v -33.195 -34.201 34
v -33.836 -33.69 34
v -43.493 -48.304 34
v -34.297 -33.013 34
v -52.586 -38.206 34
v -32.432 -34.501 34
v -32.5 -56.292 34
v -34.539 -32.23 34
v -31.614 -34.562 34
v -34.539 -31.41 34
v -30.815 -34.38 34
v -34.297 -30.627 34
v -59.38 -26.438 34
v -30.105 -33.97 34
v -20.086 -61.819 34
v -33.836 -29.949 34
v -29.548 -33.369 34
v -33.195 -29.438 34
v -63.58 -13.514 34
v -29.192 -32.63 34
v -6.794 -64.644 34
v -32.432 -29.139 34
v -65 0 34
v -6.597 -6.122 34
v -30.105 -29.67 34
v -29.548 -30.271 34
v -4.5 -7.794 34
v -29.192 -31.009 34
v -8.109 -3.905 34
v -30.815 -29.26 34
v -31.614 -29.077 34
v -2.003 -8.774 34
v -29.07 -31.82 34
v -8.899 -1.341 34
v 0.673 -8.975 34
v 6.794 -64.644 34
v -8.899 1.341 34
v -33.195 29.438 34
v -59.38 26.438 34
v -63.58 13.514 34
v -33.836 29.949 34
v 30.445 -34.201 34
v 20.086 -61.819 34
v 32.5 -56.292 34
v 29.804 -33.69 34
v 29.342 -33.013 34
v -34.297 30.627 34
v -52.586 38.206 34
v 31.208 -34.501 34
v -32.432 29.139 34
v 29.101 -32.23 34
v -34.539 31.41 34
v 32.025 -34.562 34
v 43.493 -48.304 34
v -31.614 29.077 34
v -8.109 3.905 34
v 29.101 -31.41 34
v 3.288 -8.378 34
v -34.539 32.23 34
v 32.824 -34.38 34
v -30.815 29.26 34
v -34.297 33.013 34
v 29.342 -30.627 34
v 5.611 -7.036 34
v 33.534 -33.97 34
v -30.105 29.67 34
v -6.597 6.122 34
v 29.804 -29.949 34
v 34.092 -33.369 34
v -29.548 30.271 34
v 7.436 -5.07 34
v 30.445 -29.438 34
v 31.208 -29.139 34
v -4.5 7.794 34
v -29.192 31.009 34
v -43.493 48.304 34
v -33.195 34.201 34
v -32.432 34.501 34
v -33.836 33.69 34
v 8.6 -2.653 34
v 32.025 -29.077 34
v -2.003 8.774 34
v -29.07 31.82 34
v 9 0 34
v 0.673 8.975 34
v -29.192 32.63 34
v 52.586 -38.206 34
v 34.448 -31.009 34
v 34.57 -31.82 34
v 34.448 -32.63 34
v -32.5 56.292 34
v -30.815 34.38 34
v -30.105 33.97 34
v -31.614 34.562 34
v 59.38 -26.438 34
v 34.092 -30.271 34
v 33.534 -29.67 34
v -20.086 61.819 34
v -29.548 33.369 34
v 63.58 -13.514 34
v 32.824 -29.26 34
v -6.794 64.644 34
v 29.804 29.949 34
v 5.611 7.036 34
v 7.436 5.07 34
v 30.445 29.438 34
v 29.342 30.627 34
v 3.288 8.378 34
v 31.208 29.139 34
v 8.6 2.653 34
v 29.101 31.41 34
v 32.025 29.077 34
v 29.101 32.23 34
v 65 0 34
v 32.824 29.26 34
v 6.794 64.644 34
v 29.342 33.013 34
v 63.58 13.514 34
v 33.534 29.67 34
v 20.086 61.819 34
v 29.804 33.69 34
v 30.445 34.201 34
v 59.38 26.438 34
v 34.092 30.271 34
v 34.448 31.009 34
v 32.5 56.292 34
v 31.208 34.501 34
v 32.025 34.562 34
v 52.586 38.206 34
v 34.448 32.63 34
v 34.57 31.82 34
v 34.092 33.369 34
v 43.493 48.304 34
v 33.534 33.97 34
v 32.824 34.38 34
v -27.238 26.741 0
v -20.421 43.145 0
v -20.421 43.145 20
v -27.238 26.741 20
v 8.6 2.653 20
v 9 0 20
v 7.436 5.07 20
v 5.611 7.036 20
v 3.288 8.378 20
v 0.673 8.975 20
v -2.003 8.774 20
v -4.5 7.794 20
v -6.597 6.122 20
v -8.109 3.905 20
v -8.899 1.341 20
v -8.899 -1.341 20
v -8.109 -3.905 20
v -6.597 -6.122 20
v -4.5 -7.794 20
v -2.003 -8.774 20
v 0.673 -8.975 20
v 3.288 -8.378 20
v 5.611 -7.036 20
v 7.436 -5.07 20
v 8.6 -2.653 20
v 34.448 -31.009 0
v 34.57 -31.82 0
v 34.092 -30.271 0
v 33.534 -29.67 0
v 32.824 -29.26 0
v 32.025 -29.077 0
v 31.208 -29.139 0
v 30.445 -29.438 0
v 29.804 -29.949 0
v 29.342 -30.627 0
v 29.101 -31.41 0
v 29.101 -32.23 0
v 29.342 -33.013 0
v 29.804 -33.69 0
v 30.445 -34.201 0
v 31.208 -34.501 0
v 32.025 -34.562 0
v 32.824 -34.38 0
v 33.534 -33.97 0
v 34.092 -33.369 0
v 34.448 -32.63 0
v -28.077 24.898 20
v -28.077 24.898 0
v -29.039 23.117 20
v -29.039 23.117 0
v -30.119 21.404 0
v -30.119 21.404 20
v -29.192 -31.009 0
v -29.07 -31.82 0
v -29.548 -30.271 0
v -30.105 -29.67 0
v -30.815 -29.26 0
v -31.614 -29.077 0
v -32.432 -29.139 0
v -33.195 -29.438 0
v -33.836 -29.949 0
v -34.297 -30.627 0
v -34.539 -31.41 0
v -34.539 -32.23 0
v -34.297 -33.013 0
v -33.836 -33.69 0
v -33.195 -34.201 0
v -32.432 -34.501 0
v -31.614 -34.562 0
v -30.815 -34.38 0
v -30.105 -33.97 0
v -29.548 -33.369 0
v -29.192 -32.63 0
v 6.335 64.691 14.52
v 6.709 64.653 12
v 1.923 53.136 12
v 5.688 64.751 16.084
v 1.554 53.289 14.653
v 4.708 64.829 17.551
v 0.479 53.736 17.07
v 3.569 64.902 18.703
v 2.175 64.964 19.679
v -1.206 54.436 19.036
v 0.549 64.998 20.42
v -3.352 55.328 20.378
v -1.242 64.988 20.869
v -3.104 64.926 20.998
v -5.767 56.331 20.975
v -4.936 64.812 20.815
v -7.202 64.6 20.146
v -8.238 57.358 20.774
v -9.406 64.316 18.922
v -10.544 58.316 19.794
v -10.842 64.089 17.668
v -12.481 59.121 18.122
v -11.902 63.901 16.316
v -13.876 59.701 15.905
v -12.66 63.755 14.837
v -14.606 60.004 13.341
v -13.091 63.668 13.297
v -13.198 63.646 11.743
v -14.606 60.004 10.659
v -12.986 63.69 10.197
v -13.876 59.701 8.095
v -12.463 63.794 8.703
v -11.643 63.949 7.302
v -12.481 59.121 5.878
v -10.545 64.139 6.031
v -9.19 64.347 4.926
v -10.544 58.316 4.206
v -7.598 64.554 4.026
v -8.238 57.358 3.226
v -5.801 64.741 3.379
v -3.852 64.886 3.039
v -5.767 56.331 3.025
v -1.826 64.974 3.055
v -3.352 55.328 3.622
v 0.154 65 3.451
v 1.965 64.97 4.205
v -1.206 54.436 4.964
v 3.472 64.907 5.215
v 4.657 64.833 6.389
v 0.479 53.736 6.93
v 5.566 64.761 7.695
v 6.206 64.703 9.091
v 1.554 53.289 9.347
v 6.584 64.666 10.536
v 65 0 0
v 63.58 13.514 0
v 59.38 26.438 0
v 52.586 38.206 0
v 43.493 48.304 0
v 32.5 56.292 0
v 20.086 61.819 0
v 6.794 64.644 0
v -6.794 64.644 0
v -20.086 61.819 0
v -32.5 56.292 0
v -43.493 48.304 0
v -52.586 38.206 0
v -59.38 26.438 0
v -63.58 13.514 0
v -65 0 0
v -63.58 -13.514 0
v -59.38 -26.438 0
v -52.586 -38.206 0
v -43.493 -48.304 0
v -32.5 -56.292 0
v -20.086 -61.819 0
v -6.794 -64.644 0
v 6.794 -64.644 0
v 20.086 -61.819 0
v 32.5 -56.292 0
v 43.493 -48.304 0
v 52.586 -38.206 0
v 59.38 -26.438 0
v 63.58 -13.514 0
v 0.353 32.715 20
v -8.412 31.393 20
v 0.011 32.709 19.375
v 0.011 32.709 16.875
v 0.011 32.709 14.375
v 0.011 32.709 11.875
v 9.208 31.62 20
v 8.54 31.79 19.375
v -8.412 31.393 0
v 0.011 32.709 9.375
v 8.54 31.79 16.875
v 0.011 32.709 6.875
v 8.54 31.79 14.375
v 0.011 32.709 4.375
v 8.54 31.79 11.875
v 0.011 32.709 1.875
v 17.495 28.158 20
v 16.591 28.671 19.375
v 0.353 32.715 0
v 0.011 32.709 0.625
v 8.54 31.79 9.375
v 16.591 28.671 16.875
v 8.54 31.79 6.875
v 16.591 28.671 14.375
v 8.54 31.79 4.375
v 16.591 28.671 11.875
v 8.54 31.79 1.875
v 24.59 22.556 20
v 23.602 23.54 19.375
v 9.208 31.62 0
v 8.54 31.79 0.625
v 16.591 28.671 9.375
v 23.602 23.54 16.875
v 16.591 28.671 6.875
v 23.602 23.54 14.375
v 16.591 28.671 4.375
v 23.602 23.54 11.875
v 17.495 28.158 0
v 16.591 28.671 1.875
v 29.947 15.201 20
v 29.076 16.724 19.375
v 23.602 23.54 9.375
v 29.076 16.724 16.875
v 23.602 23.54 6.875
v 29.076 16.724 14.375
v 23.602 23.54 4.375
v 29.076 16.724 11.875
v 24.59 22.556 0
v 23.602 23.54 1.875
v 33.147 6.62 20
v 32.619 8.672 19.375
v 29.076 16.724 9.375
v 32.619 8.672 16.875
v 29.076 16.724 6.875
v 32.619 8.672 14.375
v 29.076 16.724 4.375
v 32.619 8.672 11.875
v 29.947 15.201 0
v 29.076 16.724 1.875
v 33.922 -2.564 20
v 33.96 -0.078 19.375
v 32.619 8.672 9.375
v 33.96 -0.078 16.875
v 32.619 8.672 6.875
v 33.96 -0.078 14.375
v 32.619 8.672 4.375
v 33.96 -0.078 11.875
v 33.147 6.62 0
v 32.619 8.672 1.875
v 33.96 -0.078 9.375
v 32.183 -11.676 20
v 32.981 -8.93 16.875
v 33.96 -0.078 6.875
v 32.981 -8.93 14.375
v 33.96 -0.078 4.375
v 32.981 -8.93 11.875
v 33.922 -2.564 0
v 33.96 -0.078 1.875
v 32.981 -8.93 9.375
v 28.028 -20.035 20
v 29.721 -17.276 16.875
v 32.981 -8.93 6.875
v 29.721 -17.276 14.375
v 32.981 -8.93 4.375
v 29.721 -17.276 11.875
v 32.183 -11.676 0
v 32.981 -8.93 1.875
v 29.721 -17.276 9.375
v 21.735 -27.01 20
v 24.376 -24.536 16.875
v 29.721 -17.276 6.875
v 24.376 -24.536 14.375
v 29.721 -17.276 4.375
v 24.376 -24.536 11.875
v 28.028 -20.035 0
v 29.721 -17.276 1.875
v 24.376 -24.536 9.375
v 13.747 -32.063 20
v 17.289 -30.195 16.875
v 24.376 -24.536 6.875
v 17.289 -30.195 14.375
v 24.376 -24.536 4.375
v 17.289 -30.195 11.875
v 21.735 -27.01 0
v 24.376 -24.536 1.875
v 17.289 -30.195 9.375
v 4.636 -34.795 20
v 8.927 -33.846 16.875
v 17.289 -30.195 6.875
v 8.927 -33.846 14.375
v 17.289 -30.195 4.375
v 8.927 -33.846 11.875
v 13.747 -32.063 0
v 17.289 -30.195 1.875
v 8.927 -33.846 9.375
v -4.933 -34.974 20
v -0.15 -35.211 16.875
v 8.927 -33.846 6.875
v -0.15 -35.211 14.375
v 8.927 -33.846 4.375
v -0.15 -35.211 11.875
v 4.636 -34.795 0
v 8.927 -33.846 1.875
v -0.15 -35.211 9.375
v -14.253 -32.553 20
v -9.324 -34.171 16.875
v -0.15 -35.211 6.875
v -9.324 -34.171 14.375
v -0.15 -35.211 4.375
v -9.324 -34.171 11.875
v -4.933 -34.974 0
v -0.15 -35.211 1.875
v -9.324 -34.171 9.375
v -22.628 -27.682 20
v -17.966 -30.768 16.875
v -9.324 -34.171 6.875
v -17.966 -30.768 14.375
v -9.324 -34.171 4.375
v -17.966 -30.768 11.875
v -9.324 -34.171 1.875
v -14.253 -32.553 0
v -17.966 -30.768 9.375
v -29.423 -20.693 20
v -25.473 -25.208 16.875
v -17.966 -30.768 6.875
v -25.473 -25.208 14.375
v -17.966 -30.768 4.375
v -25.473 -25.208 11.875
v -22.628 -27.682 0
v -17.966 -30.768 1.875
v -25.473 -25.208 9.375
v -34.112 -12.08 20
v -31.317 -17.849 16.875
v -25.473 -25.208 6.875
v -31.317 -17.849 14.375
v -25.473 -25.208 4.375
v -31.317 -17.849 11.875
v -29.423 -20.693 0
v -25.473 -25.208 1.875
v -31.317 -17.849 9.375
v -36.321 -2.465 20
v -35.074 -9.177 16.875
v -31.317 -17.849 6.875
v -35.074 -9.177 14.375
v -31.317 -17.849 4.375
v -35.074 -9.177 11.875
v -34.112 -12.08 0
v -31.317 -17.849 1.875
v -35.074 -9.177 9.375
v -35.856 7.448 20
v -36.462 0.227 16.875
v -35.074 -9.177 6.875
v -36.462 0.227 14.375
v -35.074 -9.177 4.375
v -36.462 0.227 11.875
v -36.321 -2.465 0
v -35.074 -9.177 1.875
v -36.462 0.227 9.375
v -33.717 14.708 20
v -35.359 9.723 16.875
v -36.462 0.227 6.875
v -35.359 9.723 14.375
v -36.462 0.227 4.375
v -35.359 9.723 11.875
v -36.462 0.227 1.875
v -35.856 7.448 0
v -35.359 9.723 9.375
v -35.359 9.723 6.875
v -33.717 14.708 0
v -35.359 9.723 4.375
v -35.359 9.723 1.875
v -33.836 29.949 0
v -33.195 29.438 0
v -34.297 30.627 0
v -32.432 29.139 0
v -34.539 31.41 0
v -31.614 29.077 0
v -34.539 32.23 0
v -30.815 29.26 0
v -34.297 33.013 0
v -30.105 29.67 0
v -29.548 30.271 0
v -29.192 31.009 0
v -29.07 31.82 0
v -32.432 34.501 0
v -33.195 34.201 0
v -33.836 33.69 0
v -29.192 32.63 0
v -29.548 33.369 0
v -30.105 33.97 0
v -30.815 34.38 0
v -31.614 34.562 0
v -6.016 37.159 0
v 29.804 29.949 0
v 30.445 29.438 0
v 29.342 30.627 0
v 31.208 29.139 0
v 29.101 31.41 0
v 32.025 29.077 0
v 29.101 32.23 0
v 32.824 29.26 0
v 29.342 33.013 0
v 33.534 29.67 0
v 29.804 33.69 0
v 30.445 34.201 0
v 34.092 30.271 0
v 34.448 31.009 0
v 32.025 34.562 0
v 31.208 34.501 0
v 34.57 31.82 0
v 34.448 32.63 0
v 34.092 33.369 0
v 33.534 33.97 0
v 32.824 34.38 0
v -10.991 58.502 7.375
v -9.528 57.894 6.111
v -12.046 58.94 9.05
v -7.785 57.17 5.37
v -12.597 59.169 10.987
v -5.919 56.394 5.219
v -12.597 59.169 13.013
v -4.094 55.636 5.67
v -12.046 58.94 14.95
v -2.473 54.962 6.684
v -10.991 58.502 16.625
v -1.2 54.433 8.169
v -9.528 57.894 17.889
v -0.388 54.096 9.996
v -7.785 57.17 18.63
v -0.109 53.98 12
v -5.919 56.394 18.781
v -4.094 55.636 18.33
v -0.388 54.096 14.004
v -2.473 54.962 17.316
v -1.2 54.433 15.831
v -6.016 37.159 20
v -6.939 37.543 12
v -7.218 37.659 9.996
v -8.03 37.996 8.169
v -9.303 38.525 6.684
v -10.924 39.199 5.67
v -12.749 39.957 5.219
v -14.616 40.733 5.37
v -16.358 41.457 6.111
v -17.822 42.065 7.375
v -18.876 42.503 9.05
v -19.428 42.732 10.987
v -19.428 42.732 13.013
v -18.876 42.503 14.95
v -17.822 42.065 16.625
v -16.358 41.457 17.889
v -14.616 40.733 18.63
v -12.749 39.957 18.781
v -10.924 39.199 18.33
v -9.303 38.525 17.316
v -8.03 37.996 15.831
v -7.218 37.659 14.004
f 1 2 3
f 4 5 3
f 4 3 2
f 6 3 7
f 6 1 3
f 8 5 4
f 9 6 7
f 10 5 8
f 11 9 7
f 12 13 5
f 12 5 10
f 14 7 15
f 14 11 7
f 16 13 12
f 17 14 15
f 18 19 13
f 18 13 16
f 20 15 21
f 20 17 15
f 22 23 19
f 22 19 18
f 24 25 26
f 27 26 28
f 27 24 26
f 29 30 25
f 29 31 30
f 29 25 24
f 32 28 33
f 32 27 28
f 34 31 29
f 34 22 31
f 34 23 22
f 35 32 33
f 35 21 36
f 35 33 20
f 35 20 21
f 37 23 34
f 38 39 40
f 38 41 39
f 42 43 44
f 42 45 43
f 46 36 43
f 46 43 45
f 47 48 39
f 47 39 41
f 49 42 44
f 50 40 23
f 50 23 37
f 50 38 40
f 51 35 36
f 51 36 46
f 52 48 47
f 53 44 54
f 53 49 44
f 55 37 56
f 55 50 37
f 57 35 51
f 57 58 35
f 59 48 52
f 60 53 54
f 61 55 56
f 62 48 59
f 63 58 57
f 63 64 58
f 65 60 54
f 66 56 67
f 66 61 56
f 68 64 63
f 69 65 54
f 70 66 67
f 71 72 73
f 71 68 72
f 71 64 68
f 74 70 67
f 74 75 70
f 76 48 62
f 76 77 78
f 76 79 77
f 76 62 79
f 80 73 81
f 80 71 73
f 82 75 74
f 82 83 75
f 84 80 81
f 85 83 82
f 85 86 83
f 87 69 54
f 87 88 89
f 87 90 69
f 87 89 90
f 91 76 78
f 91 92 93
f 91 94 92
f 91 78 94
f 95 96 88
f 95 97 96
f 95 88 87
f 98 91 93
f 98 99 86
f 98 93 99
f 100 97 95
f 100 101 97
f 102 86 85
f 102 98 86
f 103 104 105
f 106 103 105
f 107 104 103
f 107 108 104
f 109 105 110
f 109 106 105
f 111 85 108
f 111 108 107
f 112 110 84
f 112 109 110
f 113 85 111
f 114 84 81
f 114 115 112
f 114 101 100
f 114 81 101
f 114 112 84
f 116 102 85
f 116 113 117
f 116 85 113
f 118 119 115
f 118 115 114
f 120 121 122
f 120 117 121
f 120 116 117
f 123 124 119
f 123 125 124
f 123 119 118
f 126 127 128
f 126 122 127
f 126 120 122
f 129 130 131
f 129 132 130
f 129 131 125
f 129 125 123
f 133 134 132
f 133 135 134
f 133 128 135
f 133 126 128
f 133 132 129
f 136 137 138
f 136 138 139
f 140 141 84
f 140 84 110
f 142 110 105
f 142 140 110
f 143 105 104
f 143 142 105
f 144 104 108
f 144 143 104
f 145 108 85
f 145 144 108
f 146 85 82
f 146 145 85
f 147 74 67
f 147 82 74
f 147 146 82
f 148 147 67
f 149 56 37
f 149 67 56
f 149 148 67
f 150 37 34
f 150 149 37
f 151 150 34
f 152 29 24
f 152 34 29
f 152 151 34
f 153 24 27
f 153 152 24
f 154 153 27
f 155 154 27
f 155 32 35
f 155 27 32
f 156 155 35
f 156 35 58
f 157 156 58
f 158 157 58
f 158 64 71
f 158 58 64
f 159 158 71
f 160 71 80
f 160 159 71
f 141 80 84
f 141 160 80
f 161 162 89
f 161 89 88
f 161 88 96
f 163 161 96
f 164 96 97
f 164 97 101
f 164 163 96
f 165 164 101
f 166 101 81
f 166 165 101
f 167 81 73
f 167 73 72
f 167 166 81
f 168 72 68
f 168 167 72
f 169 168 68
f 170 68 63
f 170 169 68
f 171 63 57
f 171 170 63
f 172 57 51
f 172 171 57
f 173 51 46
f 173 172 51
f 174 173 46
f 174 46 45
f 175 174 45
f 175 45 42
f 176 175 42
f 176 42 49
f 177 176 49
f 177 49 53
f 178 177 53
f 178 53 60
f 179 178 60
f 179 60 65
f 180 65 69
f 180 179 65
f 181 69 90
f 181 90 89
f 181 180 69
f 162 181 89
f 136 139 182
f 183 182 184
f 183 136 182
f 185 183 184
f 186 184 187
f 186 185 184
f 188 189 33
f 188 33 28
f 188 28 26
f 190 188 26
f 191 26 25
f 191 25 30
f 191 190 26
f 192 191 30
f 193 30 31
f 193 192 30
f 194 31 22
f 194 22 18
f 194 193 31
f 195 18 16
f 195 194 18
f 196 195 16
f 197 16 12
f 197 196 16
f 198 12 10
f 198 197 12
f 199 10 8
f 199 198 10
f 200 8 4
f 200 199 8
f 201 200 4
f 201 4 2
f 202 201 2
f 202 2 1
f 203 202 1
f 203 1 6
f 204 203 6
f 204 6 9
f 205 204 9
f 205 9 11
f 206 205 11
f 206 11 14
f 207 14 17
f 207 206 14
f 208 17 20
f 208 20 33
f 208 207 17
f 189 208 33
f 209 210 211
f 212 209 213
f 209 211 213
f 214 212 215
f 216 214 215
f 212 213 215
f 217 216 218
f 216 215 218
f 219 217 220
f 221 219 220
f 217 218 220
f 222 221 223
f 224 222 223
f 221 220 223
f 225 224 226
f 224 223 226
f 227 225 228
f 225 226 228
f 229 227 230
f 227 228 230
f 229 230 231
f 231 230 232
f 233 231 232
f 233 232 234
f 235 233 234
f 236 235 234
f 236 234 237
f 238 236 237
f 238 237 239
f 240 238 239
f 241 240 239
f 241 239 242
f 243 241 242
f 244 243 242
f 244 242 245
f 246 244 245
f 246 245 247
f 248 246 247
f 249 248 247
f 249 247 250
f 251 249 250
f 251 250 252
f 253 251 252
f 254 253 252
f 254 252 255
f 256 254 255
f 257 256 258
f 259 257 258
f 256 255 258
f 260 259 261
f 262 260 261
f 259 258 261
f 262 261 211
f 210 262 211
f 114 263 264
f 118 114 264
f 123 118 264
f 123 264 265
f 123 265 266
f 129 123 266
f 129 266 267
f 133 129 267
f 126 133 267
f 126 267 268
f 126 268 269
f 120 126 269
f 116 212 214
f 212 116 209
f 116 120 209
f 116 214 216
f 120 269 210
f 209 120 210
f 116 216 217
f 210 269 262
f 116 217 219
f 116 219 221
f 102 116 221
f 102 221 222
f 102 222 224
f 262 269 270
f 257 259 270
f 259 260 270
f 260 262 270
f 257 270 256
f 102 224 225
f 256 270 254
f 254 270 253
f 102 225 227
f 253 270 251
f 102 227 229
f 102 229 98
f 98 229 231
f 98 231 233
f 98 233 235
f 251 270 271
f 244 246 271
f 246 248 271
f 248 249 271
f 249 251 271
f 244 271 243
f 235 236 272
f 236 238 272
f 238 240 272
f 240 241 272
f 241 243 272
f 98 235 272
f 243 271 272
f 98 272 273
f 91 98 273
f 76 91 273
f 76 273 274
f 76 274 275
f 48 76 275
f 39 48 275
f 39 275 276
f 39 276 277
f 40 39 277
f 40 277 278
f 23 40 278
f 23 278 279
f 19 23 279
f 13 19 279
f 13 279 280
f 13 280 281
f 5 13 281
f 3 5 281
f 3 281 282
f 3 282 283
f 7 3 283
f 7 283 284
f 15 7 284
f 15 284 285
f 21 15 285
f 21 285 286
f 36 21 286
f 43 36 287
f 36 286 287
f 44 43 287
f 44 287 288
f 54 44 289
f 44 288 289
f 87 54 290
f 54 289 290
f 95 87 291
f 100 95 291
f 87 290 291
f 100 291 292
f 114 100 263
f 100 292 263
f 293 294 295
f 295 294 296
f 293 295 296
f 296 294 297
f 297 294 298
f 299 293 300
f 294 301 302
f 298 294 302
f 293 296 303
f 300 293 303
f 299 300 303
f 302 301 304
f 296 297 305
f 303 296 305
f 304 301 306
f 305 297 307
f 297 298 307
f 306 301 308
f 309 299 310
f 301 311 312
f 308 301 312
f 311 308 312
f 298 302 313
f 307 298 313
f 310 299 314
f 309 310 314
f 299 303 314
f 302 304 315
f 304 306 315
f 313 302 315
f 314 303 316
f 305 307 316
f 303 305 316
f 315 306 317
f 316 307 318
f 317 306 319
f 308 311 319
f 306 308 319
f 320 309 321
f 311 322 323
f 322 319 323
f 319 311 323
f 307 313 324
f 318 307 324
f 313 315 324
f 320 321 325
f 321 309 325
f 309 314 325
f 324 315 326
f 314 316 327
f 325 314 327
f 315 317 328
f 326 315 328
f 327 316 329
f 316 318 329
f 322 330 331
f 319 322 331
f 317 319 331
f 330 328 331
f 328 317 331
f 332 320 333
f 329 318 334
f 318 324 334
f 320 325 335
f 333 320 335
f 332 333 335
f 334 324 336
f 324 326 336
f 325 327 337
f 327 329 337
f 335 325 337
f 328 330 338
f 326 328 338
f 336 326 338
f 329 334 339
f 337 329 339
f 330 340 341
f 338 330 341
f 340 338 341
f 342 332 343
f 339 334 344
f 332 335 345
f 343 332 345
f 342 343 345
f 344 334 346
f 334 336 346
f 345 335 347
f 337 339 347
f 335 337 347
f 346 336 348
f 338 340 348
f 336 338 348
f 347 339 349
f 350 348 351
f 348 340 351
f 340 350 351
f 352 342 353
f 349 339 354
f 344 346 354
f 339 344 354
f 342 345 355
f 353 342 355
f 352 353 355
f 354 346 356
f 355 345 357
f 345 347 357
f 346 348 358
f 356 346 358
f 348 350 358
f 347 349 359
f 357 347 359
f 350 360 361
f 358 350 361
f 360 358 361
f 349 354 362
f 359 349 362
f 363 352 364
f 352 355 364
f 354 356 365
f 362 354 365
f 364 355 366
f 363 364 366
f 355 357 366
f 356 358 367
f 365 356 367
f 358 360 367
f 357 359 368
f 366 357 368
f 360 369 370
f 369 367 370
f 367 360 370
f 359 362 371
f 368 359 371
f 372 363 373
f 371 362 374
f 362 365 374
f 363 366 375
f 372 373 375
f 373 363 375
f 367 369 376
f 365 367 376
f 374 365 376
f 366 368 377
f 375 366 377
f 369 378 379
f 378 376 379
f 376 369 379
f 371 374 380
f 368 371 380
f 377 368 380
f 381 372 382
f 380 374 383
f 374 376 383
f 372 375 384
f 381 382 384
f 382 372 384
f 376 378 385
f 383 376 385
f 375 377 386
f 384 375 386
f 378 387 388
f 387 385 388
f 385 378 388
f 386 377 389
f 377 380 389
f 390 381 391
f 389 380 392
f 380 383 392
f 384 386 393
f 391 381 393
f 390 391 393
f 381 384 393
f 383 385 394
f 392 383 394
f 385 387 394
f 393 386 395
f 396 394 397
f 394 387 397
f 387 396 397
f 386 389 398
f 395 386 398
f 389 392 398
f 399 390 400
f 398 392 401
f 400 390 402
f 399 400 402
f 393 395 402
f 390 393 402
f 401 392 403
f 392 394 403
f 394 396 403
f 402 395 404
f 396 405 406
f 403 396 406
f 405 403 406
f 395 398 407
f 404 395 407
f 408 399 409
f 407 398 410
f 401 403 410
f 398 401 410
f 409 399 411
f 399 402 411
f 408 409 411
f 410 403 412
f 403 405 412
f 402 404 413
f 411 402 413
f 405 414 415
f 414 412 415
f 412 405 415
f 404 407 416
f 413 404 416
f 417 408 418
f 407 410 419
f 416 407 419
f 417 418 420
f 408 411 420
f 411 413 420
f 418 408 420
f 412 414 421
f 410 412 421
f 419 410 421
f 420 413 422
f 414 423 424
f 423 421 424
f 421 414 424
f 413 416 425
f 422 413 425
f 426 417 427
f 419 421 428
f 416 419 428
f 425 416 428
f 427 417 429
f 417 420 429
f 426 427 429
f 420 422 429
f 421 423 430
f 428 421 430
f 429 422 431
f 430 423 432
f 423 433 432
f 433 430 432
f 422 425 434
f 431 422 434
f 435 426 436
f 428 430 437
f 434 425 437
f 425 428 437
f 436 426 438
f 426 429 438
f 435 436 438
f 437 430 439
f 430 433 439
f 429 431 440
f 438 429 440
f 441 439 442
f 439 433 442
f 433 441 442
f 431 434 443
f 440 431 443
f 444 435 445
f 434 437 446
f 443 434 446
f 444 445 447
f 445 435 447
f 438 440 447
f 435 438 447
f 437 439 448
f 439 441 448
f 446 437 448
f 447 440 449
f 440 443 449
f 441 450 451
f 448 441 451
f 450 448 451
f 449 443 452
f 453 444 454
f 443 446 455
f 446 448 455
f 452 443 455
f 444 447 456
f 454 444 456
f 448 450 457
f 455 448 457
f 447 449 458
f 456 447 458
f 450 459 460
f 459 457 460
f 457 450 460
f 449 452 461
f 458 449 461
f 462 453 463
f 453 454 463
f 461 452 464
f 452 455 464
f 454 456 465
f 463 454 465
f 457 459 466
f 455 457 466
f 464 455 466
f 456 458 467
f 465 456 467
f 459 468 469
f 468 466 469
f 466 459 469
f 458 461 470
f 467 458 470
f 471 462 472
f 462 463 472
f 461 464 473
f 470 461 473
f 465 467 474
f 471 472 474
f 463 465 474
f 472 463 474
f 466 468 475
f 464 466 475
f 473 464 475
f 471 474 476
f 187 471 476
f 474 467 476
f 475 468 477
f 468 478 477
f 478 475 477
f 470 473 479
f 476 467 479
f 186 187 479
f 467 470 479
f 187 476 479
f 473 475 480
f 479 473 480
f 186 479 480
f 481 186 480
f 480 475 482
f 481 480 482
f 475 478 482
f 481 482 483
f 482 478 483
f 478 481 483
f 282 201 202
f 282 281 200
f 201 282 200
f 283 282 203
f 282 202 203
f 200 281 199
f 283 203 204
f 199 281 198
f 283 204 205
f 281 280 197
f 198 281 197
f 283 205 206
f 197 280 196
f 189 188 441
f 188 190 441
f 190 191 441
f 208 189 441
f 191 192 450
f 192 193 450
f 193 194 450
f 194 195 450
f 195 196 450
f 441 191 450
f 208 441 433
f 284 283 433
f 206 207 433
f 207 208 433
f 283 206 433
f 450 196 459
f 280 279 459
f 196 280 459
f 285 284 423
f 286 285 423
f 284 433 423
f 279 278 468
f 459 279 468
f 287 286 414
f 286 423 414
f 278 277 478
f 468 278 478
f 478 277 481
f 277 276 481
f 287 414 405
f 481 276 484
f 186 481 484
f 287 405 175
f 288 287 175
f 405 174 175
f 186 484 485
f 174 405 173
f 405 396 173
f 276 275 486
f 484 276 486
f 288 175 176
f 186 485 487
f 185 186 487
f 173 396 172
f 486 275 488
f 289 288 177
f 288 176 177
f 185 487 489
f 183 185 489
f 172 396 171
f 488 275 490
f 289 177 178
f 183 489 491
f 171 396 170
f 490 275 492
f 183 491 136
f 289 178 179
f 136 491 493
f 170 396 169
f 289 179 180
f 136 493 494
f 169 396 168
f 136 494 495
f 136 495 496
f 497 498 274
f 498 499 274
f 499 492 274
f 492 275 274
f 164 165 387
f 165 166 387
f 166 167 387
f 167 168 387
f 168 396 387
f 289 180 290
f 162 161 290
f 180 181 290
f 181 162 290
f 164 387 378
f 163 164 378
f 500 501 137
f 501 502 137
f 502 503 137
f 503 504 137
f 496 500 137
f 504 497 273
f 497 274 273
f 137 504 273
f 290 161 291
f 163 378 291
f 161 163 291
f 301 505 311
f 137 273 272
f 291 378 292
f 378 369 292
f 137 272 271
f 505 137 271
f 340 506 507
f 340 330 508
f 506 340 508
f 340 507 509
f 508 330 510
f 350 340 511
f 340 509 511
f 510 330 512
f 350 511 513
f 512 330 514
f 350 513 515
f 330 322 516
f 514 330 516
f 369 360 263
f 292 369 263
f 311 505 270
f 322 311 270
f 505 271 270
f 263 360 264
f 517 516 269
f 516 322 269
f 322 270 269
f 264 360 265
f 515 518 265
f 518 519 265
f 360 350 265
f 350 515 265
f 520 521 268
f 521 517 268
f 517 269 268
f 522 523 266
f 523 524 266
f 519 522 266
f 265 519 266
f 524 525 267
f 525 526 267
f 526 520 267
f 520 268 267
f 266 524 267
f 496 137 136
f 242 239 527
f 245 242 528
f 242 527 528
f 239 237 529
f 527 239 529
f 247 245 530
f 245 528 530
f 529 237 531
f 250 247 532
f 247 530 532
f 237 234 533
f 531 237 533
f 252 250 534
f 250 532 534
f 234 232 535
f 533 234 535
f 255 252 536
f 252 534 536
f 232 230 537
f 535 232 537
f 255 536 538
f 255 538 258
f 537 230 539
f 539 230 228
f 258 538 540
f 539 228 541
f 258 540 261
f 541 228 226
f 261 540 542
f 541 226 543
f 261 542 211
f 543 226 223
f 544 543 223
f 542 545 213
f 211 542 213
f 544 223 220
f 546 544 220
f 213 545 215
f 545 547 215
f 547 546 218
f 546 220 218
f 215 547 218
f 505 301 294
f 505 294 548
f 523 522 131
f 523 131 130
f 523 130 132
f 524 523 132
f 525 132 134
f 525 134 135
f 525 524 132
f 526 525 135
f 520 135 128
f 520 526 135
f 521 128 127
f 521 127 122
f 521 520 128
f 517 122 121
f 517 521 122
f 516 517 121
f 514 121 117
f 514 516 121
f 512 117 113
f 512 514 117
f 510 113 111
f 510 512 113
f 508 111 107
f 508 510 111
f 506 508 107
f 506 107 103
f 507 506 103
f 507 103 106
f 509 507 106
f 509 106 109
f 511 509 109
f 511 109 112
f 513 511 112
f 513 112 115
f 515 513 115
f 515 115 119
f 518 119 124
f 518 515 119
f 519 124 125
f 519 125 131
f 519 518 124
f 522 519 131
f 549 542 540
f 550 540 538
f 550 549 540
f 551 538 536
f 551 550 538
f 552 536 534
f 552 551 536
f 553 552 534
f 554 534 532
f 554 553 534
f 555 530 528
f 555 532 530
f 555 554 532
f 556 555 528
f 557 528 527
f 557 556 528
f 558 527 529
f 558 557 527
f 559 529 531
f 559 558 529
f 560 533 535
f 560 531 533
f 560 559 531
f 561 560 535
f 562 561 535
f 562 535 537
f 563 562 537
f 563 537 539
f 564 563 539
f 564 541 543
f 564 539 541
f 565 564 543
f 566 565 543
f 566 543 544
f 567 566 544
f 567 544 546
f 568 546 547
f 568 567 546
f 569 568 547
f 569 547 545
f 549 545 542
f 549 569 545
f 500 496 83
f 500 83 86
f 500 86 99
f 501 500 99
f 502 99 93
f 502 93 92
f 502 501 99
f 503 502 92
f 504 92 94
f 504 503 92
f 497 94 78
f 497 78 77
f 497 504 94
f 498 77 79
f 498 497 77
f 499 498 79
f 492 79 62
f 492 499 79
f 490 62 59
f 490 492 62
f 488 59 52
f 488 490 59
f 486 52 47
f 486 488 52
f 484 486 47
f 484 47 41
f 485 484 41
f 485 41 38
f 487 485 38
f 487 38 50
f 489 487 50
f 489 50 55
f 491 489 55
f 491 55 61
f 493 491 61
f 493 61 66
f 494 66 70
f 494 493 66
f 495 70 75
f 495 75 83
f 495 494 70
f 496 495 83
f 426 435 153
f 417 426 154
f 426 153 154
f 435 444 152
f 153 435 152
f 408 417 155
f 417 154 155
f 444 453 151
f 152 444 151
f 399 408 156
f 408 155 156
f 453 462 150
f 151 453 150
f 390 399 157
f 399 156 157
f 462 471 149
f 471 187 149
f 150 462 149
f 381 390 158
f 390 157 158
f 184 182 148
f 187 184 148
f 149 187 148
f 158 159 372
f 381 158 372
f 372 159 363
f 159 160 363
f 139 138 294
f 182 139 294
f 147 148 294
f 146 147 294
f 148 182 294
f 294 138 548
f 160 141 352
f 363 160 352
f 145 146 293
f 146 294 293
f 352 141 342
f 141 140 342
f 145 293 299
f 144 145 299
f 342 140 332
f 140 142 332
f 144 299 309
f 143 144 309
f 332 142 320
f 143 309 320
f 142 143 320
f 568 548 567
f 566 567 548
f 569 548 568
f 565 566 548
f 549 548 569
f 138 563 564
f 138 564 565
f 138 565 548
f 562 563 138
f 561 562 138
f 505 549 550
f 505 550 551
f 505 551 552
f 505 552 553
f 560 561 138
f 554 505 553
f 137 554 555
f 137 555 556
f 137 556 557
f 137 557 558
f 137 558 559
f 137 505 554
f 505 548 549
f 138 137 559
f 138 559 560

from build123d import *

# Parameters (mm, degrees)
SKETCH3_R          = 65
SKETCH3_R_2        = 2.75
EXTRUDE1_DEPTH     = 34
CUT_EXTRUDE2_DEPTH = 20
SKETCH22_R         = 6.8
CUT_EXTRUDE3_DEPTH = 53.960179098
SKETCH26_R         = 9
CUT_EXTRUDE4_DEPTH = 35.0000001
SKETCH27_R         = 9
CUT_EXTRUDE5_DEPTH = 36.160179098


with BuildPart() as part:
    # Sketch3 → Extrude1 (new body)
    with BuildSketch(Plane.XY):
        Circle(SKETCH3_R)
        with Locations((31.819805153, -31.819805153)):
            Circle(SKETCH3_R_2, mode=Mode.SUBTRACT)
        with Locations((-31.819805153, -31.819805153)):
            Circle(SKETCH3_R_2, mode=Mode.SUBTRACT)
        with Locations((31.819805153, 31.819805153)):
            Circle(SKETCH3_R_2, mode=Mode.SUBTRACT)
        with Locations((-31.819805153, 31.819805153)):
            Circle(SKETCH3_R_2, mode=Mode.SUBTRACT)
    extrude(amount=EXTRUDE1_DEPTH)

    # Sketch3_6 → Cut-Extrude2 (cut)
    with BuildSketch(Plane.XY):
        with BuildLine():
            Line((-20.421328258, 43.144950309), (-27.237880936, 26.740610009))
            ThreePointArc((-27.237880936, 26.740610009), (-28.54324707, 23.999538948), (-30.118972052, 21.404439318))
            add(Edge.make_bspline(
                [(-8.411618966, 31.392589354), (-6.594986557, 31.927343906), (-4.727596656, 32.304011663), (-0.947579394, 32.726950043), (0.964989801, 32.773208373), (4.777108777, 32.531081057), (6.676598891, 32.242693441), (10.404207822, 31.337263886), (12.232267294, 30.720230446), (15.760360448, 29.173637758), (17.460336939, 28.244097303), (20.679062247, 26.098347596), (22.197757805, 24.882166939), (25.005835643, 22.198009273), (26.295170268, 20.730069861), (28.60307704, 17.585286262), (29.621608652, 15.90848759), (31.354425209, 12.395644964), (32.068678043, 10.559653108), (33.168512452, 6.783381836), (33.554071399, 4.84315955), (33.981977998, 0.91703866), (34.024313279, -1.068799499), (33.761644813, -5.025657895), (33.456639413, -6.996616206), (32.505786005, -10.863180522), (31.859947203, -12.758725015), (30.244434466, -16.415746217), (29.274780398, -18.177163724), (27.038718465, -21.510852538), (25.772340603, -23.083068793), (22.979235835, -25.988634722), (21.452548225, -27.321935222), (18.18350905, -29.706877352), (16.441204938, -30.758477245), (12.792592203, -32.545523582), (10.886337796, -33.28093707), (6.966927518, -34.410539179), (4.95383101, -34.804704707), (0.881572969, -35.237007362), (-1.17752584, -35.275132047), (-5.279057127, -34.991353155), (-7.321425423, -34.669448256), (-11.326780574, -33.672621975), (-13.289703752, -32.997710517), (-17.075395447, -31.312765708), (-18.898102754, -30.302753307), (-22.346412369, -27.975919739), (-23.971957836, -26.659129989), (-26.974594454, -23.756685335), (-28.351634915, -22.171071432), (-30.813133029, -18.777462502), (-31.89754775, -16.969516871), (-33.738297145, -13.184908034), (-34.494598024, -11.208301165), (-35.653409825, -7.145620969), (-36.055897198, -5.05960924), (-36.492023631, -0.841182208), (-36.525650191, 1.29116809), (-36.220191785, 5.537304064), (-35.881105833, 7.651023301), (-34.837758132, 11.795003117), (-34.13350703, 13.825197856), (-32.378618873, 17.739300975), (-31.328003859, 19.623146143), (-30.118972052, 21.404439318)],
                knots=[0, 0, 0, 0, 0.03125, 0.03125, 0.0625, 0.0625, 0.09375, 0.09375, 0.125, 0.125, 0.15625, 0.15625, 0.1875, 0.1875, 0.21875, 0.21875, 0.25, 0.25, 0.28125, 0.28125, 0.3125, 0.3125, 0.34375, 0.34375, 0.375, 0.375, 0.40625, 0.40625, 0.4375, 0.4375, 0.46875, 0.46875, 0.5, 0.5, 0.53125, 0.53125, 0.5625, 0.5625, 0.59375, 0.59375, 0.625, 0.625, 0.65625, 0.65625, 0.6875, 0.6875, 0.71875, 0.71875, 0.75, 0.75, 0.78125, 0.78125, 0.8125, 0.8125, 0.84375, 0.84375, 0.875, 0.875, 0.90625, 0.90625, 0.9375, 0.9375, 0.96875, 0.96875, 1, 1, 1, 1], degree=3))
            Line((-8.411618966, 31.392589354), (-6.015539335, 37.158862647))
            Line((-6.015539335, 37.158862647), (-20.421328258, 43.144950309))
        make_face()
    extrude(amount=CUT_EXTRUDE2_DEPTH, mode=Mode.SUBTRACT)

    # Sketch22 → Cut-Extrude3 (cut, through all)
    with BuildSketch(Plane(origin=(12.281446339, 29.555852442, 0), x_dir=(-0.923448008, 0.383723568, 0), z_dir=(0.383723568, 0.923448008, 0))):
        with Locations(Location((27.613769175, 12, 0), (0, 0, 180))):  # turned: the seam where the file's is
            Circle(SKETCH22_R)
    extrude(amount=CUT_EXTRUDE3_DEPTH, mode=Mode.SUBTRACT)

    # Sketch26 → Cut-Extrude4 (cut, through all)
    with BuildSketch(Plane.XY):
        Circle(SKETCH26_R)
    extrude(amount=CUT_EXTRUDE4_DEPTH, mode=Mode.SUBTRACT)

    # Sketch27 → Cut-Extrude5 (cut, through all)
    with BuildSketch(Plane(origin=(19.11172585, 45.993226983, 0), x_dir=(0.923448008, -0.383723568, 0), z_dir=(-0.383723568, -0.923448008, 0))):
        with Locations((-27.613769175, 12)):
            Circle(SKETCH27_R)
    extrude(amount=-CUT_EXTRUDE5_DEPTH, mode=Mode.SUBTRACT)


solid = part.part
